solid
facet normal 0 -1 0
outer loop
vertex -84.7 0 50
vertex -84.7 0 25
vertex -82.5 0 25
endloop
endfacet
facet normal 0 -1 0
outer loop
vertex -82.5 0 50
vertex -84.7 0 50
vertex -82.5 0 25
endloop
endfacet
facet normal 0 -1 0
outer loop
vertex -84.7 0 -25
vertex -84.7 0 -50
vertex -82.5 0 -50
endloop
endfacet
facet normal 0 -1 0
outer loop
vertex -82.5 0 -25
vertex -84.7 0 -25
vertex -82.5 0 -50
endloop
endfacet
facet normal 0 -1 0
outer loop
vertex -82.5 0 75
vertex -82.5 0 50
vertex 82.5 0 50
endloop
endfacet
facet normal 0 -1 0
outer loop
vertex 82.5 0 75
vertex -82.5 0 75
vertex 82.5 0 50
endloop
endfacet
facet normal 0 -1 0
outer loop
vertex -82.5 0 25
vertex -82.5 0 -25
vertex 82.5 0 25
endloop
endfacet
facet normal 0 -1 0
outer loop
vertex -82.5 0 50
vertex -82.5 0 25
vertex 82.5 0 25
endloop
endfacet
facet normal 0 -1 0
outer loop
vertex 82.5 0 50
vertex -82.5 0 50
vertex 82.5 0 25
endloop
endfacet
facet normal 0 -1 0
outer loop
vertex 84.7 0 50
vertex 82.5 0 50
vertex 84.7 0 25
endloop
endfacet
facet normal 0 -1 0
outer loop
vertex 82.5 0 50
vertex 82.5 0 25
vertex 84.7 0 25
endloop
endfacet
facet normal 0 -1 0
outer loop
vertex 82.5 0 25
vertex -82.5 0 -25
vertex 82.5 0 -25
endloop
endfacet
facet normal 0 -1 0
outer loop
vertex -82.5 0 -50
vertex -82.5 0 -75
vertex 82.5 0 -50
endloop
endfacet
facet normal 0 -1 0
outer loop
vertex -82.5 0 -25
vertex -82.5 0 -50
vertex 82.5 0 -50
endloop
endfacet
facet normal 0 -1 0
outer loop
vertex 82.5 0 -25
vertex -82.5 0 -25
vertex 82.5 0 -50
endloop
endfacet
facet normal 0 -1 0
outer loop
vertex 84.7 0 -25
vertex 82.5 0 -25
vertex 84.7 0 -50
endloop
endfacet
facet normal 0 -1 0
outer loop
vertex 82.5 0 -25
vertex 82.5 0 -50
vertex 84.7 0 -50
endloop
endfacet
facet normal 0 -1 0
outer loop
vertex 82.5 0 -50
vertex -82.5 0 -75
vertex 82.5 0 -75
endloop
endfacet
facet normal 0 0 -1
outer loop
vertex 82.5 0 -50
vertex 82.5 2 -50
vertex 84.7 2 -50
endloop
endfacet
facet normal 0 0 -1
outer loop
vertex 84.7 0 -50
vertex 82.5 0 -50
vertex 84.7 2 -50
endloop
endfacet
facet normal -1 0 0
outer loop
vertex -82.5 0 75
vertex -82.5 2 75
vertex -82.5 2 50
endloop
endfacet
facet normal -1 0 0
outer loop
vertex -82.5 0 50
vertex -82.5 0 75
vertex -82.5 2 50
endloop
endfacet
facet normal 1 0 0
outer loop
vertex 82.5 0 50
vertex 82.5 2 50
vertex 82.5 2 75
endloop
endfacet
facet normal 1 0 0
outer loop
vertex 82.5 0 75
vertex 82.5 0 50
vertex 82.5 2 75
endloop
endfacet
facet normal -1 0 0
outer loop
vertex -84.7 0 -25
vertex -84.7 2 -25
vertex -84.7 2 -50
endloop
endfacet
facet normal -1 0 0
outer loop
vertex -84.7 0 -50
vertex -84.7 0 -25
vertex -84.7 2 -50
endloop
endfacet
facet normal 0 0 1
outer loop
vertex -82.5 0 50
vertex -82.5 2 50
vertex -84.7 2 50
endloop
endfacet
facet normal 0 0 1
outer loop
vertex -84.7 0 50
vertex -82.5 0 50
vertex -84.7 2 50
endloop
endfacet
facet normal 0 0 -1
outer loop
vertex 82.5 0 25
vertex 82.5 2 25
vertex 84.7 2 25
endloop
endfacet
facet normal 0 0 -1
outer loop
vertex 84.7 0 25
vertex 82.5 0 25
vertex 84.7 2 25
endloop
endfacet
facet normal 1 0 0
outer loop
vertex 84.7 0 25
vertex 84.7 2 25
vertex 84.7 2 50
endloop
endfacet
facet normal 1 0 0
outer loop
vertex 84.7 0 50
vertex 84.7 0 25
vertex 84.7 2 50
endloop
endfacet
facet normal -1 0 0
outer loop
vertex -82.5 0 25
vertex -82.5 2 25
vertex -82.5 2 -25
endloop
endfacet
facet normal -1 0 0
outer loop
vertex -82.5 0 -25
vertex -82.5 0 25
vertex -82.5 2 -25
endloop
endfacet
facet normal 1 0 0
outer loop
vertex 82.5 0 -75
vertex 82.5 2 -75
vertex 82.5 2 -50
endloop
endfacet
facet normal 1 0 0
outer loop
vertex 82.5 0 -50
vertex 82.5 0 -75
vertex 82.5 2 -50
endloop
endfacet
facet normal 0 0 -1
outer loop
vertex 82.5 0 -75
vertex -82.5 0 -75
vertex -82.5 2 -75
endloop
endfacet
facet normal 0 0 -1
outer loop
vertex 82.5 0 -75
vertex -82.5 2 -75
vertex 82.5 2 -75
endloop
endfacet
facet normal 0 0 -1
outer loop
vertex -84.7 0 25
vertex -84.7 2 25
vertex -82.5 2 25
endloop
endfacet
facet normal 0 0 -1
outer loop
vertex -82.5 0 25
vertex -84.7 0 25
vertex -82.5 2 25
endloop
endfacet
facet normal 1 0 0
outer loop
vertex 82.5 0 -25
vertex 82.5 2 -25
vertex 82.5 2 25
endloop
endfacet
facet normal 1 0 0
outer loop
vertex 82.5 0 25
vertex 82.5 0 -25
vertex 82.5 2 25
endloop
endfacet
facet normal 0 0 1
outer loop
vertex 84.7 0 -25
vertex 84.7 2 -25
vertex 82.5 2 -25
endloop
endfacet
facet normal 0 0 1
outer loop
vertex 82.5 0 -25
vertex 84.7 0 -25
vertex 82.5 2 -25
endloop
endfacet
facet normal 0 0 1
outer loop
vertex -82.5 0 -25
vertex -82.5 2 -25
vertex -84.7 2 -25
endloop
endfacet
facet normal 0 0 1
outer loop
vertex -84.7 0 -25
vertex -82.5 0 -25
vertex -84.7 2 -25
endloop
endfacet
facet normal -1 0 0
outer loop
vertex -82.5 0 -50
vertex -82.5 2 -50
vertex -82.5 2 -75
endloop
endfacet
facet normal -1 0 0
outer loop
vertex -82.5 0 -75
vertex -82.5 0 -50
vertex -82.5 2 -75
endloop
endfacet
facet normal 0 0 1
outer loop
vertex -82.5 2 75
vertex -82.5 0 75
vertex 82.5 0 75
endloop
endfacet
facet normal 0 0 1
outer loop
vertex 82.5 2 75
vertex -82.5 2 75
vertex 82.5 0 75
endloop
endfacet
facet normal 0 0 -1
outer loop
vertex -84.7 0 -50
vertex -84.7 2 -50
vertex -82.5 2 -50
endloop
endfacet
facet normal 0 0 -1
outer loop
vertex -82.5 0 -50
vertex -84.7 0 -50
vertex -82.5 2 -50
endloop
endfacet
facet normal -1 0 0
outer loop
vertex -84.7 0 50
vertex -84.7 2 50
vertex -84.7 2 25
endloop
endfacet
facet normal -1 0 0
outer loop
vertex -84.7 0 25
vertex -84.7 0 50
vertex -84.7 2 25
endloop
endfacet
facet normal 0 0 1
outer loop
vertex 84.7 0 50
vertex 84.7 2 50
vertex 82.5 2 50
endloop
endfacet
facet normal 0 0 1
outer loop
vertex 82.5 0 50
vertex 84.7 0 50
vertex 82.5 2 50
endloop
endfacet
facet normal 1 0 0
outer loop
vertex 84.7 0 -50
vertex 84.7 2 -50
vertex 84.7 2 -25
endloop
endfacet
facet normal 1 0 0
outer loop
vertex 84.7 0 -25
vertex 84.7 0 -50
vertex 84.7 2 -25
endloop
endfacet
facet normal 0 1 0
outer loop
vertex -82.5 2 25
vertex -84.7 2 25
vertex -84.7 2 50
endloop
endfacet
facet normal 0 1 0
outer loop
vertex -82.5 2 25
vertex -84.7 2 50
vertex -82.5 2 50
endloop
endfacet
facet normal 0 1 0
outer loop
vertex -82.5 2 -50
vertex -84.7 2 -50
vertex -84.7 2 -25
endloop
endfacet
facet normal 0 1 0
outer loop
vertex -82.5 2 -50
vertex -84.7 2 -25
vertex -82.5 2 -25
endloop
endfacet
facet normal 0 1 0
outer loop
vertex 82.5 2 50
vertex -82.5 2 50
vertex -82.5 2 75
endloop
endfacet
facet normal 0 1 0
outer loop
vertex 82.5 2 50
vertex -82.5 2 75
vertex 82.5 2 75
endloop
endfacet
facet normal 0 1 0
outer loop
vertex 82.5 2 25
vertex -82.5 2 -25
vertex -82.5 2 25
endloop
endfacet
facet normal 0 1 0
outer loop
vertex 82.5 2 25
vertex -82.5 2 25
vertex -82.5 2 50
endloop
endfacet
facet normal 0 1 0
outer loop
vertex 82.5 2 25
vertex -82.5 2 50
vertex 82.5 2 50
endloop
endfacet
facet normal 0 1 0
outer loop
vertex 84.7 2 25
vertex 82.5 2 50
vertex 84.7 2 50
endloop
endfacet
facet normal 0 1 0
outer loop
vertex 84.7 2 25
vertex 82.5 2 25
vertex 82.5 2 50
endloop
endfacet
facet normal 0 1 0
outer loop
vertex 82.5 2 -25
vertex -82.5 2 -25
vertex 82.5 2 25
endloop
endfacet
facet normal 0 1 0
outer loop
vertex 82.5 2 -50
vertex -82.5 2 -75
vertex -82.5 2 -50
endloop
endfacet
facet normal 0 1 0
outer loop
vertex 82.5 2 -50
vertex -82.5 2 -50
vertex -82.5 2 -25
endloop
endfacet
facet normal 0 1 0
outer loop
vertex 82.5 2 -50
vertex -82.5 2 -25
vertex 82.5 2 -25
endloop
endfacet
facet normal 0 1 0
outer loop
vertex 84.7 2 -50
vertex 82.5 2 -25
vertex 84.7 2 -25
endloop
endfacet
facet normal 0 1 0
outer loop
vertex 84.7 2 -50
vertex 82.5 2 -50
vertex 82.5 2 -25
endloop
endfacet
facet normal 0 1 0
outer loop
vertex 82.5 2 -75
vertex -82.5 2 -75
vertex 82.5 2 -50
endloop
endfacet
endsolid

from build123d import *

# Parameters (mm, degrees)
SKETCH1_W           = 169.4
SKETCH1_H           = 150
BOSS_EXTRUDE1_DEPTH = 2
CUT_EXTRUDE1_DEPTH  = 2


with BuildPart() as part:
    # Sketch1 → Boss-Extrude1 (new body)
    with BuildSketch(Plane(origin=(0, 0, 0), x_dir=(1, 0, 0), z_dir=(0, 1, 0))):
        Rectangle(SKETCH1_W, SKETCH1_H)
    extrude(amount=BOSS_EXTRUDE1_DEPTH)

    # Sketch2 → Cut-Extrude1 (cut)
    with BuildSketch(Plane(origin=(0, 2, 0), x_dir=(1, 0, 0), z_dir=(0, 1, 0))):
        Polygon((82.5, -50), (82.5, -75), (87.923107592, -75), (87.923107592, 75), (82.5, 75), (82.5, 50), (84.7, 50), (84.7, 25), (82.5, 25), (82.5, -25), (84.7, -25), (84.7, -50), align=None)
        Polygon((-82.5, 50), (-82.5, 75), (-87.923107592, 75), (-87.923107592, -75), (-82.5, -75), (-82.5, -50), (-84.7, -50), (-84.7, -25), (-82.5, -25), (-82.5, 25), (-84.7, 25), (-84.7, 50), align=None)
    extrude(amount=-CUT_EXTRUDE1_DEPTH, mode=Mode.SUBTRACT)


solid = part.part
